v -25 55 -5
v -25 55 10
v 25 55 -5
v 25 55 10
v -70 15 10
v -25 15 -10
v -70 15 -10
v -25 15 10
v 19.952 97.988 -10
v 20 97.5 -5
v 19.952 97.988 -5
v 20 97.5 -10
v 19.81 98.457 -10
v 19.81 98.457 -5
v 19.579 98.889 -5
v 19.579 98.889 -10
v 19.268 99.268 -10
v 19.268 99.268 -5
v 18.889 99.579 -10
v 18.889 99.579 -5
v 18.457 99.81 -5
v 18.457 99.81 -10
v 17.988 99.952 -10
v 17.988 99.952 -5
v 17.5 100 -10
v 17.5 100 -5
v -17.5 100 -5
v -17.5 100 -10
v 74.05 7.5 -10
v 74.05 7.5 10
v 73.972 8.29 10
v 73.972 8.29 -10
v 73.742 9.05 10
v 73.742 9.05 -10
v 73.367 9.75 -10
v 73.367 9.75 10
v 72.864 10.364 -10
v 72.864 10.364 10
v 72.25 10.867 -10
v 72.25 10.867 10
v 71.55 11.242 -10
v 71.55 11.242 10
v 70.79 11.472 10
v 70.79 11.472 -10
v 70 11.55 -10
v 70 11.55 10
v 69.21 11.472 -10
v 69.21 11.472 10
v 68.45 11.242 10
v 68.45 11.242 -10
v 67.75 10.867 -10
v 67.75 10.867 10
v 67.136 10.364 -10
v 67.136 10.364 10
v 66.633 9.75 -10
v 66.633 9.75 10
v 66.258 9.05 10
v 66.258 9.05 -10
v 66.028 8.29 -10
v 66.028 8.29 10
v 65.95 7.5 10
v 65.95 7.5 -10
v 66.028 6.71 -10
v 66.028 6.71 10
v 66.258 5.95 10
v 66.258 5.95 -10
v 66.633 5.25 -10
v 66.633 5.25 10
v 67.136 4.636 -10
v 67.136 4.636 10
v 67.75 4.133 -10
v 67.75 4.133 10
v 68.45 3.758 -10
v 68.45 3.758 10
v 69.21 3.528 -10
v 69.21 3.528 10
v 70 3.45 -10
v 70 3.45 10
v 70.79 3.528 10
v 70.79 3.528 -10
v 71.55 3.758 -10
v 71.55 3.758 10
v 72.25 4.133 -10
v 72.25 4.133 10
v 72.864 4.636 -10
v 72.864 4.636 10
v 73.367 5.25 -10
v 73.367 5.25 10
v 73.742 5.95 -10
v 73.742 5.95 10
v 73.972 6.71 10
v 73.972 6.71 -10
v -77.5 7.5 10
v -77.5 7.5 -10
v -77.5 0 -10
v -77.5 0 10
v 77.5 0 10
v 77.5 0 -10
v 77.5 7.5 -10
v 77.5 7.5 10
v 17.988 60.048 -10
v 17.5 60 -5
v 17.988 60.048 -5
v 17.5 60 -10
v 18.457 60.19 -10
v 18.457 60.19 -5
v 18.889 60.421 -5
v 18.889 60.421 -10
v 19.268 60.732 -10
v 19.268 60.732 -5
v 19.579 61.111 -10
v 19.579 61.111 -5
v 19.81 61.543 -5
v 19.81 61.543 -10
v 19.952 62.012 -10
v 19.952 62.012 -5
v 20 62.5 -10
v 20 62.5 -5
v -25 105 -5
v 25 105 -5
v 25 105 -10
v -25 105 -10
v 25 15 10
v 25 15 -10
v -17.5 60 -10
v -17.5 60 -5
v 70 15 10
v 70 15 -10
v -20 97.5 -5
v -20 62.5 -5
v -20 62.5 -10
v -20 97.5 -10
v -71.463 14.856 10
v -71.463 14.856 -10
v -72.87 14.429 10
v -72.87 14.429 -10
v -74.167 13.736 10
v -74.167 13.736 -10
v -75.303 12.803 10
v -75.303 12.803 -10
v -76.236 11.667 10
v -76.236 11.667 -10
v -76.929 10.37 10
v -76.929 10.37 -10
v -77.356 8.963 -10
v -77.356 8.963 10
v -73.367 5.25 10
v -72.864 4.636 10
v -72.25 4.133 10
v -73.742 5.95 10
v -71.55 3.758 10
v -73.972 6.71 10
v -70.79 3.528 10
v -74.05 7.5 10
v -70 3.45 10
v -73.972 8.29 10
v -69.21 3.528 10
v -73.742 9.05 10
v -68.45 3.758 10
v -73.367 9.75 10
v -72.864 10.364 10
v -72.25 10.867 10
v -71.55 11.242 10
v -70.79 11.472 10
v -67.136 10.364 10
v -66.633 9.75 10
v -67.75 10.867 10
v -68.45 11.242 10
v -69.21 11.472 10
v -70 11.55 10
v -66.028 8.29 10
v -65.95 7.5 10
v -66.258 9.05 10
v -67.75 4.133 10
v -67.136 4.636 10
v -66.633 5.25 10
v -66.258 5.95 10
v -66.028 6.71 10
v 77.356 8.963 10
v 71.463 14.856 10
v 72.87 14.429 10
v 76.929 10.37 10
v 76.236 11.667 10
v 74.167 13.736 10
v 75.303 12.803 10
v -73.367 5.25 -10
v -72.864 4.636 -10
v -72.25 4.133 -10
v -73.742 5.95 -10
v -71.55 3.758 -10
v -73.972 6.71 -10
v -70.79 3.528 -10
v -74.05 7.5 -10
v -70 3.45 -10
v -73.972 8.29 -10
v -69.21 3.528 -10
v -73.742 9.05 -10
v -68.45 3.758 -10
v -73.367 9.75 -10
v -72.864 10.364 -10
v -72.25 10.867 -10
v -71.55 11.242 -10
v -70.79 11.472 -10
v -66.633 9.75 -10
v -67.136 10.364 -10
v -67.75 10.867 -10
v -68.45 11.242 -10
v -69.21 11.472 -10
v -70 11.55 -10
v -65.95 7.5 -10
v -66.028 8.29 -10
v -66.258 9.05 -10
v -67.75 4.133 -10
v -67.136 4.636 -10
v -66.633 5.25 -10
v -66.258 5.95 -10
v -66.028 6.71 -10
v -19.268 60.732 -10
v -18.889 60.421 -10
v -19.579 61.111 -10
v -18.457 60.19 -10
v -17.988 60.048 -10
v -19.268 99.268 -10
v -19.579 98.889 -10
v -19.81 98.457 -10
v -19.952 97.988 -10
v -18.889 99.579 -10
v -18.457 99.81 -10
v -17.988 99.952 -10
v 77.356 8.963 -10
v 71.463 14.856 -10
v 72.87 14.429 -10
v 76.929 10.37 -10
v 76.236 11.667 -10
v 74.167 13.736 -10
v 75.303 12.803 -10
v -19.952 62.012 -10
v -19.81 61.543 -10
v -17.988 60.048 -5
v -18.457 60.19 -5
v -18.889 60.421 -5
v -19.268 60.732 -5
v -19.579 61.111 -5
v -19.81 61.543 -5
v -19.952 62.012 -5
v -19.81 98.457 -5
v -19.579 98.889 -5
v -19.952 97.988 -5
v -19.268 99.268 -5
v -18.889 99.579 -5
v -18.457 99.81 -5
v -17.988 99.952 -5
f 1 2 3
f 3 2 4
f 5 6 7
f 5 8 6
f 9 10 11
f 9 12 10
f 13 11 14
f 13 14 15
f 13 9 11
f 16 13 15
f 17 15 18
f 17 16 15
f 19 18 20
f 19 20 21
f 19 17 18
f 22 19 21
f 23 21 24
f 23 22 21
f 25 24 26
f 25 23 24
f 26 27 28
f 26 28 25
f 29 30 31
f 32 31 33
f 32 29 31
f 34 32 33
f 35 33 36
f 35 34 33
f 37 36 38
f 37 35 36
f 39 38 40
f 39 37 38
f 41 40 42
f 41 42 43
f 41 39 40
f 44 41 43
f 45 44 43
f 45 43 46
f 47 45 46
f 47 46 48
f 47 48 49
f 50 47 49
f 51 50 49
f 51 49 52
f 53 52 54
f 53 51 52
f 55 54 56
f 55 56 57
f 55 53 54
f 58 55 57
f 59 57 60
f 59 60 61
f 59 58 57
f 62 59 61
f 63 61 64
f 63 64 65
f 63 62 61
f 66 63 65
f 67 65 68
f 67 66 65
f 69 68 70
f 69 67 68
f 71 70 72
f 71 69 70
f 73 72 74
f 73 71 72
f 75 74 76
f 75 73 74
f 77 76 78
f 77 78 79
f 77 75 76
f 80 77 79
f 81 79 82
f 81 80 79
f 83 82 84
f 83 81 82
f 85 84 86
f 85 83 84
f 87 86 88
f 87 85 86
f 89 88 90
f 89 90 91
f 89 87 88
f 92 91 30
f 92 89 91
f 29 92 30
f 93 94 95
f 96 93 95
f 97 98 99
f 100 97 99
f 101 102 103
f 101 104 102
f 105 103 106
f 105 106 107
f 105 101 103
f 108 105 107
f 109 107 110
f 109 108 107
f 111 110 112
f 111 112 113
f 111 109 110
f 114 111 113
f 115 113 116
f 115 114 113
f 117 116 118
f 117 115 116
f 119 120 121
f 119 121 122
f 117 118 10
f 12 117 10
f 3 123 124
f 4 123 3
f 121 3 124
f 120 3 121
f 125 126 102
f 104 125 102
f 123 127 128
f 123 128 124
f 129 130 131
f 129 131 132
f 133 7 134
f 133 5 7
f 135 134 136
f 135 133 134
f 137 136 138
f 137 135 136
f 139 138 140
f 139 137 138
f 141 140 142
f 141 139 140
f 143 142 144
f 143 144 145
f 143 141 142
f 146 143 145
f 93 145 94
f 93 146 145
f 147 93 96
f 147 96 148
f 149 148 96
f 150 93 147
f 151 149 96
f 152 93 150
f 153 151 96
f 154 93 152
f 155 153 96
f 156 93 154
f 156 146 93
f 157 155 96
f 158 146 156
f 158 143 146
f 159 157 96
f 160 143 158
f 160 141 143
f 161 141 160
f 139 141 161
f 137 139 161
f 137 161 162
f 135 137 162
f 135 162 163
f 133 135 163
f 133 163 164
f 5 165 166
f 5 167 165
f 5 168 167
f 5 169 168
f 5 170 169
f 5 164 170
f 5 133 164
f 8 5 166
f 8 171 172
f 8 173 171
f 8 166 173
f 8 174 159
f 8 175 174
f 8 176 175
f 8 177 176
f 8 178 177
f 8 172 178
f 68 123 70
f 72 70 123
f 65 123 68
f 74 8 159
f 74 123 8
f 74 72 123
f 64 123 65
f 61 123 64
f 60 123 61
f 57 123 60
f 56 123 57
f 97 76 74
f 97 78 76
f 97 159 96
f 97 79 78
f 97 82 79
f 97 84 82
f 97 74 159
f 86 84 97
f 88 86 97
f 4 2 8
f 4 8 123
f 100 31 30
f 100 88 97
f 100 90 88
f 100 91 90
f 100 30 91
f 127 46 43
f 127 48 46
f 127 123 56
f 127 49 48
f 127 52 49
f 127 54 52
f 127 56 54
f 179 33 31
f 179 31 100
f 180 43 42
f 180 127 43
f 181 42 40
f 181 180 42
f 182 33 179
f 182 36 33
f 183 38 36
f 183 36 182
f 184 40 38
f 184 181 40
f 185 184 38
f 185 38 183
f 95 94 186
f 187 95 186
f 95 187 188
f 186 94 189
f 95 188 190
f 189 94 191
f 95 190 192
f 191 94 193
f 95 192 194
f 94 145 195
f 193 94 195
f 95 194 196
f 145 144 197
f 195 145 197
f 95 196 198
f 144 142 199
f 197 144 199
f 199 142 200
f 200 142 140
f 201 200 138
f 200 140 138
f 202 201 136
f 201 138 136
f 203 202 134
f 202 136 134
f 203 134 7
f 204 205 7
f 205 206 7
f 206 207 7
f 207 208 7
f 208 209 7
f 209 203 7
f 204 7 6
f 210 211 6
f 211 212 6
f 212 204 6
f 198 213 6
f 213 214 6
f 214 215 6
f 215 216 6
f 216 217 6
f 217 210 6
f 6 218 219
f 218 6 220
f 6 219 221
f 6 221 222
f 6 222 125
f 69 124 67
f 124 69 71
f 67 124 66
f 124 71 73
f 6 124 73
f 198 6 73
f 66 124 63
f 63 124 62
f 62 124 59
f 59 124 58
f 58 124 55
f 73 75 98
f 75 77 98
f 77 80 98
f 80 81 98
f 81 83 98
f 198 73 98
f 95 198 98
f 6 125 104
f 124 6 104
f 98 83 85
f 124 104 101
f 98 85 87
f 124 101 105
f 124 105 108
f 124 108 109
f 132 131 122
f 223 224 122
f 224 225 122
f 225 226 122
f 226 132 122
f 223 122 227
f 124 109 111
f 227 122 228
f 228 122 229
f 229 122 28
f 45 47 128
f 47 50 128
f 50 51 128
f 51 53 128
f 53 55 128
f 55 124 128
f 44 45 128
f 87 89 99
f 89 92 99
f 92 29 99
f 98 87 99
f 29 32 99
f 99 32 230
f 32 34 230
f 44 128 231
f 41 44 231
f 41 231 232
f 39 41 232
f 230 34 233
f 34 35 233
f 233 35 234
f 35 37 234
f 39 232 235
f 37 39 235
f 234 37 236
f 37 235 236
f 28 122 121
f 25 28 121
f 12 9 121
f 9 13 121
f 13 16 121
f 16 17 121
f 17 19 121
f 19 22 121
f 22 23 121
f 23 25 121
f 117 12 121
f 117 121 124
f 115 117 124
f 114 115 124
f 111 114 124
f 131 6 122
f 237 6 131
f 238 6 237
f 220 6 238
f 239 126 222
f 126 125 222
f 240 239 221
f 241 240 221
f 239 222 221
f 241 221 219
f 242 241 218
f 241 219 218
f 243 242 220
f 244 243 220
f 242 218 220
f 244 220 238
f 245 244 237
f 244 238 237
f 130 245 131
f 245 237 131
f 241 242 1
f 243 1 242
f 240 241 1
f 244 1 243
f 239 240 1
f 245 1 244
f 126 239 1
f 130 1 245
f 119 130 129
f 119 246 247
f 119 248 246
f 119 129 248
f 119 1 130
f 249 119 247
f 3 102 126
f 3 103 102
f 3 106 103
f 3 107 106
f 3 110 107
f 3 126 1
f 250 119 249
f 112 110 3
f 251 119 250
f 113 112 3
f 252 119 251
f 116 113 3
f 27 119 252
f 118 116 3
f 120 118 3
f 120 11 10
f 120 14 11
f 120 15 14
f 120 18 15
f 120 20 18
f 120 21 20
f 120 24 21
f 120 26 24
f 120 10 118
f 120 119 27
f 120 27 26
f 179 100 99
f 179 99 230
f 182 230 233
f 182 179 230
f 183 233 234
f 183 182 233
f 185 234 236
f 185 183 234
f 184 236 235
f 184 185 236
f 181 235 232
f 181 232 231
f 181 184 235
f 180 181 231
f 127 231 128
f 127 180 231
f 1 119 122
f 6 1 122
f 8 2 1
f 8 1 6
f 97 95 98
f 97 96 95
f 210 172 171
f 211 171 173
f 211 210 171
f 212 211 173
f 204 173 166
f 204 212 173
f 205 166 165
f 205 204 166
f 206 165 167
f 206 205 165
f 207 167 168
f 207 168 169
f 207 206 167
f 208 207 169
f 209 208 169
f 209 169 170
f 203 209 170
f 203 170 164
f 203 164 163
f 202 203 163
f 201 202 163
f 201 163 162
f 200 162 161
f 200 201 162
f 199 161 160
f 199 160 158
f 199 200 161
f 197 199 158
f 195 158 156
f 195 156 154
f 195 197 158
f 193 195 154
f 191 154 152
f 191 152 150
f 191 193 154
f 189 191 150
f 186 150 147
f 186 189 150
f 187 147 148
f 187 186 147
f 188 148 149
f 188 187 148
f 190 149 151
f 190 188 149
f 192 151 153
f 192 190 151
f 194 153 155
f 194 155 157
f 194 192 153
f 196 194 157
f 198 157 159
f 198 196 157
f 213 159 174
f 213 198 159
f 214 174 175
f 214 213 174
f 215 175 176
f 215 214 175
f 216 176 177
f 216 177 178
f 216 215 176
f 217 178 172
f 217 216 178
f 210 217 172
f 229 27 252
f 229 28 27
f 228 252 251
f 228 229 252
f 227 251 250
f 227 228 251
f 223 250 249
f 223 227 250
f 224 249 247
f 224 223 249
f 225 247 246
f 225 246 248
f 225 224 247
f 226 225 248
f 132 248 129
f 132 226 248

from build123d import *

# Parameters (mm, degrees)
SKETCH1_R           = 4.05
BOSS_EXTRUDE1_DEPTH = 10
SKETCH3_W           = 50
SKETCH3_H           = 50
CUT_EXTRUDE2_DEPTH  = 15
SKETCH4_W           = 40
SKETCH4_H           = 40
CUT_EXTRUDE3_DEPTH  = 132.363046554
FILLET1_R           = 2.5


with BuildPart() as part:
    # Sketch1 → Boss-Extrude1 (new, symmetric)
    with BuildSketch(Plane.XY):
        with BuildLine():
            Line((-77.5, 0), (77.5, 0))
            Line((77.5, 0), (77.5, 7.5))
            ThreePointArc((77.5, 7.5), (75.303300859, 12.803300859), (70, 15))
            Line((70, 15), (25, 15))
            Line((25, 15), (25, 105))
            Line((25, 105), (-25, 105))
            Line((-25, 105), (-25, 15))
            Line((-25, 15), (-70, 15))
            ThreePointArc((-70, 15), (-75.303300859, 12.803300859), (-77.5, 7.5))
            Line((-77.5, 7.5), (-77.5, 0))
        make_face()
        with Locations((-70, 7.5)):
            Circle(SKETCH1_R, mode=Mode.SUBTRACT)
        with Locations((70, 7.5)):
            Circle(SKETCH1_R, mode=Mode.SUBTRACT)
    extrude(amount=BOSS_EXTRUDE1_DEPTH, both=True)

    # Sketch3 → Cut-Extrude2 (cut)
    with BuildSketch(Plane.XY.offset(10)):
        with Locations((0, 80)):
            Rectangle(SKETCH3_W, SKETCH3_H)
    extrude(amount=-CUT_EXTRUDE2_DEPTH, mode=Mode.SUBTRACT)

    # Sketch4 → Cut-Extrude3 (cut, through all)
    with BuildSketch(Plane.XY.offset(-5)):
        with Locations((0, 80)):
            Rectangle(SKETCH4_W, SKETCH4_H)
    extrude(amount=-CUT_EXTRUDE3_DEPTH, mode=Mode.SUBTRACT)

    # Fillet1
    fillet1_edges = [part.edges().sort_by_distance(p)[0] for p in [
        (-20, 60, -7.5),
        (-20, 100, -7.5),
        (20, 100, -7.5),
        (20, 60, -7.5),
    ]]
    fillet(fillet1_edges, radius=FILLET1_R)


solid = part.part
